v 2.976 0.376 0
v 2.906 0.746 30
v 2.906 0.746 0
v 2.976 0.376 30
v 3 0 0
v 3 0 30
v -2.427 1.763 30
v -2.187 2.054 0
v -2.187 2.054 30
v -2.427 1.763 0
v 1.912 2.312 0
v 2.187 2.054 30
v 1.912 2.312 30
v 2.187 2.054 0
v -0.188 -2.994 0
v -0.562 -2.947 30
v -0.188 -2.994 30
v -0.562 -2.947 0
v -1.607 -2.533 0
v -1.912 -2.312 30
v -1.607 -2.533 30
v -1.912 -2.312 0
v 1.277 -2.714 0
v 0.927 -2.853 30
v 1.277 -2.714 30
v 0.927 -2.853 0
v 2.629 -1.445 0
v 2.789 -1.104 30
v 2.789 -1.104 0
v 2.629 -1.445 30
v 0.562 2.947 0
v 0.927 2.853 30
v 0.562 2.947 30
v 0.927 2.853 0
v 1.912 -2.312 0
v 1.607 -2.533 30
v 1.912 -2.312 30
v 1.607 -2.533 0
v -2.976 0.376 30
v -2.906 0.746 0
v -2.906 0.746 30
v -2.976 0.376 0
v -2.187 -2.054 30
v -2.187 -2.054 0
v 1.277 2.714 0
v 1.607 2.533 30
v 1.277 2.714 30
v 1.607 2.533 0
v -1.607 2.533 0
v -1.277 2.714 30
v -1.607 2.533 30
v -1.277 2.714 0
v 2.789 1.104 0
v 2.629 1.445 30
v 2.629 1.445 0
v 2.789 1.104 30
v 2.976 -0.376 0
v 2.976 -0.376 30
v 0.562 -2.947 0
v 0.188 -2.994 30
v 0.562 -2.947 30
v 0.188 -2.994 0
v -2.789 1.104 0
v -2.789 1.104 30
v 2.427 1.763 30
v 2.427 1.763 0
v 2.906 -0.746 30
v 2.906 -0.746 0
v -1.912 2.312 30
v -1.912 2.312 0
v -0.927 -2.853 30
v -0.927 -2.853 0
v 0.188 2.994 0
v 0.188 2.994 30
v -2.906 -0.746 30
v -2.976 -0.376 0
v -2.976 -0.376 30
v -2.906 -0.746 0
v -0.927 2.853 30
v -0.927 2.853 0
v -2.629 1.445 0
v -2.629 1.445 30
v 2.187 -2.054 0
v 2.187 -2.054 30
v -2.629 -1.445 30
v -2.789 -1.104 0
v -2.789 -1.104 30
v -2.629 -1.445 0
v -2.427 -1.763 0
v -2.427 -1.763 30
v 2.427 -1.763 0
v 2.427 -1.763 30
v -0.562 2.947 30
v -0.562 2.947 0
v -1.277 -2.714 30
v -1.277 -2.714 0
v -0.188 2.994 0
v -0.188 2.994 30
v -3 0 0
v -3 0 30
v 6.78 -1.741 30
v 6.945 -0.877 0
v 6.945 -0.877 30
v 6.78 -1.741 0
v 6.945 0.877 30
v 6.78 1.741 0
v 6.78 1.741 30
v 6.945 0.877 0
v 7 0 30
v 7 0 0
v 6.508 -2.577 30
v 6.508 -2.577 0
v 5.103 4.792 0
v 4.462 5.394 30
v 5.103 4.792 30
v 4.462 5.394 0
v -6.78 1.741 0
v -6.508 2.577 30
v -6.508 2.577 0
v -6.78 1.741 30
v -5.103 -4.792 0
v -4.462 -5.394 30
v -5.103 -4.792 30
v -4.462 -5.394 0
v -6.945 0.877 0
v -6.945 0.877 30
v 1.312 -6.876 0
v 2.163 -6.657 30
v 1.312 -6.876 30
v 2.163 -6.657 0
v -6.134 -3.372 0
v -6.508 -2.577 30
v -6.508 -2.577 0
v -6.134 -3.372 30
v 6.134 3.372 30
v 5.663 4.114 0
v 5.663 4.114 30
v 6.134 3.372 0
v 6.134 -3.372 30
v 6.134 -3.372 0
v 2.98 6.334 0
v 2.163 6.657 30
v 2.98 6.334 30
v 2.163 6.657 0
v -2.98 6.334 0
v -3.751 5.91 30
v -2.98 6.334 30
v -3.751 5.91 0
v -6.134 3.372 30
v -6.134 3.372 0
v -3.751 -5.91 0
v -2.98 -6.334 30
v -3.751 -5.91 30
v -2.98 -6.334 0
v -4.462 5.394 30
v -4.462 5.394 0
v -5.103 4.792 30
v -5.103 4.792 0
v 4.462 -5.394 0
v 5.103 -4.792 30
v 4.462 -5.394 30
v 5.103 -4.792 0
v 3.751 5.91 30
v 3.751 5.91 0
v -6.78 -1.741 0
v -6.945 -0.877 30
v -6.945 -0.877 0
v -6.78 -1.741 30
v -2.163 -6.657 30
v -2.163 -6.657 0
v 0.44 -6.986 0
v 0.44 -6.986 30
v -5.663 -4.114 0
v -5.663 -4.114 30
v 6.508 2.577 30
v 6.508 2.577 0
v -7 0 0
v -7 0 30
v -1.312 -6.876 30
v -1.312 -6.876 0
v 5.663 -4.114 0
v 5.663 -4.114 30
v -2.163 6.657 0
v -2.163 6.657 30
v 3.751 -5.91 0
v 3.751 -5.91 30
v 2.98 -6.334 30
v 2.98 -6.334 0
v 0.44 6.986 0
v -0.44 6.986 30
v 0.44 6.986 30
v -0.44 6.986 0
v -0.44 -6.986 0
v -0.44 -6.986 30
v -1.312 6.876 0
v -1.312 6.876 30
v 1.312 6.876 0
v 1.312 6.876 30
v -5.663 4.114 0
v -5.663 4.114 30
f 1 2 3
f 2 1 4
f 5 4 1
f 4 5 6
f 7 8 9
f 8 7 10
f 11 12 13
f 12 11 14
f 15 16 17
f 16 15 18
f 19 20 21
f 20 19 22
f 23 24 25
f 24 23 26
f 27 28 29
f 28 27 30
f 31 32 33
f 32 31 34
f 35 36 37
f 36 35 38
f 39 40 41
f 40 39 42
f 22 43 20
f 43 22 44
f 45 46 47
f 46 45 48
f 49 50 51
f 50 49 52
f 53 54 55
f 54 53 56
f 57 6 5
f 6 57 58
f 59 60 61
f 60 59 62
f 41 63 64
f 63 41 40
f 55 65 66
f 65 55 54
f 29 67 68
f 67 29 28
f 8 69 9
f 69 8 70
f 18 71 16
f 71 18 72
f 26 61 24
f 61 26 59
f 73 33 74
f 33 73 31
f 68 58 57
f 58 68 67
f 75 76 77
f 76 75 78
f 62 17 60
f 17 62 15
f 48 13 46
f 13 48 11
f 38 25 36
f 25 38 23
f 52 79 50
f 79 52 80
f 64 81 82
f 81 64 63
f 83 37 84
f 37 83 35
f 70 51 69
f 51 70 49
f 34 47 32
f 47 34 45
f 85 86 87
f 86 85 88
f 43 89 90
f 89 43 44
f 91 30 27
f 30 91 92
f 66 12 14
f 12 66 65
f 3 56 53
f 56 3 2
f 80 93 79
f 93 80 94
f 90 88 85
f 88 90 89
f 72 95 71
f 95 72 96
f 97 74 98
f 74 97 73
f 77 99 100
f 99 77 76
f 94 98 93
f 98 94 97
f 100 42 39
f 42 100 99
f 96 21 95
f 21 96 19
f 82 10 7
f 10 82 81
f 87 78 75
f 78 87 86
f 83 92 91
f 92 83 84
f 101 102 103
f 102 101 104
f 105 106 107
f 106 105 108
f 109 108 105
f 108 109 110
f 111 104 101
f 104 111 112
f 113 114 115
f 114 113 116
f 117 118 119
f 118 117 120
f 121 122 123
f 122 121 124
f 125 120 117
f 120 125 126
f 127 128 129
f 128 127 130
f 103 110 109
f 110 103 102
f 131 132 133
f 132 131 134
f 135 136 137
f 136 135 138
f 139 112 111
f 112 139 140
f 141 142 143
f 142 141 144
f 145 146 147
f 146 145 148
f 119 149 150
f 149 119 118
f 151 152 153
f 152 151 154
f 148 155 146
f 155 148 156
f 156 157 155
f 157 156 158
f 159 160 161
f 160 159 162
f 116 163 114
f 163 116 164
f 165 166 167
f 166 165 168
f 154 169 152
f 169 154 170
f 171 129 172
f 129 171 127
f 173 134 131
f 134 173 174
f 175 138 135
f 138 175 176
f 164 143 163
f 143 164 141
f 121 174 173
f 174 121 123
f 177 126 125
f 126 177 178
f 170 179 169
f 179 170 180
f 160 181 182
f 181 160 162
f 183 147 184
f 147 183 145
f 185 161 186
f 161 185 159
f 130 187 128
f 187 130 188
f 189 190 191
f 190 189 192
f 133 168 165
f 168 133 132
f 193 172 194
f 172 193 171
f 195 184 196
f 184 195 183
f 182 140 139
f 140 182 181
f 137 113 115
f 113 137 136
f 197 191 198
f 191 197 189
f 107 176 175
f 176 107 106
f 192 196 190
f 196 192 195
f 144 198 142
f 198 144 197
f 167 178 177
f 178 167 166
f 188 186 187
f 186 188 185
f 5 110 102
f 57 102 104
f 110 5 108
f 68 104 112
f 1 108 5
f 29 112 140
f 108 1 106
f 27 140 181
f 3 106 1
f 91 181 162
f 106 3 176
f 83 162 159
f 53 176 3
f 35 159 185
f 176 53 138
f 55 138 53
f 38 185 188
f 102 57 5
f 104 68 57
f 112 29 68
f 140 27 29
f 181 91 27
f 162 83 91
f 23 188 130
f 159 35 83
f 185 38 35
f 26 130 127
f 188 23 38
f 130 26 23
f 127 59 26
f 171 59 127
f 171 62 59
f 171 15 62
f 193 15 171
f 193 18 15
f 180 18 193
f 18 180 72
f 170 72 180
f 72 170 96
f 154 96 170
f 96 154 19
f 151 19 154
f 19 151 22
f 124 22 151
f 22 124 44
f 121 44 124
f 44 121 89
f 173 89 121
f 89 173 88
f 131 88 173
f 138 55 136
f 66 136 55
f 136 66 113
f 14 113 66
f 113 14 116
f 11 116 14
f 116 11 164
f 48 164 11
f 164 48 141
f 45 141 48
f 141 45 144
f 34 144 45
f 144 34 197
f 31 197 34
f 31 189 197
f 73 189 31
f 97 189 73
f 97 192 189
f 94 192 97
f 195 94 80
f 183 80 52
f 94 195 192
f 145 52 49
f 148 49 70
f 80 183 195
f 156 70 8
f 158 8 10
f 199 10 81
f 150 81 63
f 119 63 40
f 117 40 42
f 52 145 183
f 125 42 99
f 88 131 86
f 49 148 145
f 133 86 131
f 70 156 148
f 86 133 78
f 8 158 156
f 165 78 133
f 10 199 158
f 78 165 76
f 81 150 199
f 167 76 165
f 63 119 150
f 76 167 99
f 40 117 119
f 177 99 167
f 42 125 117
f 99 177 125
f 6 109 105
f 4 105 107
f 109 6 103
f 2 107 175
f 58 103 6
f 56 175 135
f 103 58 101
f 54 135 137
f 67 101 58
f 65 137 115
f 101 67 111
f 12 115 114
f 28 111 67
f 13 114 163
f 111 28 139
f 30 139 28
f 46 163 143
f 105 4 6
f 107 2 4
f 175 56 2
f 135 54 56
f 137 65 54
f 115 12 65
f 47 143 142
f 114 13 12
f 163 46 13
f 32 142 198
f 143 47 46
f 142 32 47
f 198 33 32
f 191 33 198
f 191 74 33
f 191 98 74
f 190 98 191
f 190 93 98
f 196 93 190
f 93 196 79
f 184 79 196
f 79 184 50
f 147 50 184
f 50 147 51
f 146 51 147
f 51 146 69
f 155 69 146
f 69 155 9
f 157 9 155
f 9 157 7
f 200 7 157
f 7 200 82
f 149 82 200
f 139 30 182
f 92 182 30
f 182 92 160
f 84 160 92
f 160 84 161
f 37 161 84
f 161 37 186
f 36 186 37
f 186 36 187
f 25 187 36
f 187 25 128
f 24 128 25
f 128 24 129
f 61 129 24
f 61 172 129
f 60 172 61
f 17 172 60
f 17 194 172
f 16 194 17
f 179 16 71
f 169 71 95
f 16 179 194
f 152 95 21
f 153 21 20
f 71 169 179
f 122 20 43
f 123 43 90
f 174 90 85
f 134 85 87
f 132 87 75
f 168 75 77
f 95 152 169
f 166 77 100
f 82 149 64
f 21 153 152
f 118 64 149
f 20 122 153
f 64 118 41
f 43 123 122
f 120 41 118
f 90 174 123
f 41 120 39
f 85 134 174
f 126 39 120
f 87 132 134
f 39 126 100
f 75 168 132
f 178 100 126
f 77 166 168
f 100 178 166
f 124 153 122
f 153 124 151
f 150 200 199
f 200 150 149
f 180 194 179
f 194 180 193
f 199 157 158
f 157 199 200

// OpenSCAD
$fn = 50;


difference() {
	union() {
		cylinder(h = 30, r = 7.0000000000);
	}
	union() {
		translate(v = [0.0000000000, 0.0000000000, -100.0000000000]) {
			cylinder(h = 200, r = 3.0000000000);
		}
		cylinder(h = 30, r = 1.5000000000);
		cylinder(h = 30, r = 1.5000000000);
		cylinder(h = 30, r = 1.5000000000);
	}
}
